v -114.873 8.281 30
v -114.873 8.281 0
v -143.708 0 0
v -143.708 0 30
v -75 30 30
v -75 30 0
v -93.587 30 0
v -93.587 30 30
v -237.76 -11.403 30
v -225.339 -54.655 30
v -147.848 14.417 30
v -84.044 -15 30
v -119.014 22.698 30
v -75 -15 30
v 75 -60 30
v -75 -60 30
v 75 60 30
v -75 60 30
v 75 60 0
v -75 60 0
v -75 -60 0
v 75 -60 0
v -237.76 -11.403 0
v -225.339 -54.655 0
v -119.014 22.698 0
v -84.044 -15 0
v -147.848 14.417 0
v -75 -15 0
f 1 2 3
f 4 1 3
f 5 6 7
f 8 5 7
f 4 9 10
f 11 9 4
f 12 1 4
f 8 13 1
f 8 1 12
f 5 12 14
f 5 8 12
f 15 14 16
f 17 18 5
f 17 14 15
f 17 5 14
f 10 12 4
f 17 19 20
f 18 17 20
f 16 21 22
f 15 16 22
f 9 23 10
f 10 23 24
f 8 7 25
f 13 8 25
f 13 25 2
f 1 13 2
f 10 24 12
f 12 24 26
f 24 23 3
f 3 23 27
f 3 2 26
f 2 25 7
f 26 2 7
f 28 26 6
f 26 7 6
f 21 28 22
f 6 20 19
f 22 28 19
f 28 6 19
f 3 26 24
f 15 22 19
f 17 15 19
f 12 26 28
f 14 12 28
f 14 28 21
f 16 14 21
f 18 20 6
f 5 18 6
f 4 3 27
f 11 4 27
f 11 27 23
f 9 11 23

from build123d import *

# Parameters (mm, degrees)
F1_DEPTH = 30


with BuildPart() as f1:
    # F0 (on Top) → F1 (new body)
    with BuildSketch(Plane.XY):
        Polygon((75, -60), (75, 60), (-75, 60), (-75, 30), (26.413014, 30), (26.413014, -15), (-75, -15), (-75, -60), align=None)
        Polygon((26.413014, 30), (-75, 30), (-93.586986, 30), (-119.013755, 22.697953), (-114.873411, 8.280687), (-143.707943, 0), (-147.848286, 14.417266), (-237.759645, -11.403435), (-225.338615, -54.655232), (-84.043801, -15), (-75, -15), (26.413014, -15), align=None)
    extrude(amount=F1_DEPTH)


solid = f1.part
